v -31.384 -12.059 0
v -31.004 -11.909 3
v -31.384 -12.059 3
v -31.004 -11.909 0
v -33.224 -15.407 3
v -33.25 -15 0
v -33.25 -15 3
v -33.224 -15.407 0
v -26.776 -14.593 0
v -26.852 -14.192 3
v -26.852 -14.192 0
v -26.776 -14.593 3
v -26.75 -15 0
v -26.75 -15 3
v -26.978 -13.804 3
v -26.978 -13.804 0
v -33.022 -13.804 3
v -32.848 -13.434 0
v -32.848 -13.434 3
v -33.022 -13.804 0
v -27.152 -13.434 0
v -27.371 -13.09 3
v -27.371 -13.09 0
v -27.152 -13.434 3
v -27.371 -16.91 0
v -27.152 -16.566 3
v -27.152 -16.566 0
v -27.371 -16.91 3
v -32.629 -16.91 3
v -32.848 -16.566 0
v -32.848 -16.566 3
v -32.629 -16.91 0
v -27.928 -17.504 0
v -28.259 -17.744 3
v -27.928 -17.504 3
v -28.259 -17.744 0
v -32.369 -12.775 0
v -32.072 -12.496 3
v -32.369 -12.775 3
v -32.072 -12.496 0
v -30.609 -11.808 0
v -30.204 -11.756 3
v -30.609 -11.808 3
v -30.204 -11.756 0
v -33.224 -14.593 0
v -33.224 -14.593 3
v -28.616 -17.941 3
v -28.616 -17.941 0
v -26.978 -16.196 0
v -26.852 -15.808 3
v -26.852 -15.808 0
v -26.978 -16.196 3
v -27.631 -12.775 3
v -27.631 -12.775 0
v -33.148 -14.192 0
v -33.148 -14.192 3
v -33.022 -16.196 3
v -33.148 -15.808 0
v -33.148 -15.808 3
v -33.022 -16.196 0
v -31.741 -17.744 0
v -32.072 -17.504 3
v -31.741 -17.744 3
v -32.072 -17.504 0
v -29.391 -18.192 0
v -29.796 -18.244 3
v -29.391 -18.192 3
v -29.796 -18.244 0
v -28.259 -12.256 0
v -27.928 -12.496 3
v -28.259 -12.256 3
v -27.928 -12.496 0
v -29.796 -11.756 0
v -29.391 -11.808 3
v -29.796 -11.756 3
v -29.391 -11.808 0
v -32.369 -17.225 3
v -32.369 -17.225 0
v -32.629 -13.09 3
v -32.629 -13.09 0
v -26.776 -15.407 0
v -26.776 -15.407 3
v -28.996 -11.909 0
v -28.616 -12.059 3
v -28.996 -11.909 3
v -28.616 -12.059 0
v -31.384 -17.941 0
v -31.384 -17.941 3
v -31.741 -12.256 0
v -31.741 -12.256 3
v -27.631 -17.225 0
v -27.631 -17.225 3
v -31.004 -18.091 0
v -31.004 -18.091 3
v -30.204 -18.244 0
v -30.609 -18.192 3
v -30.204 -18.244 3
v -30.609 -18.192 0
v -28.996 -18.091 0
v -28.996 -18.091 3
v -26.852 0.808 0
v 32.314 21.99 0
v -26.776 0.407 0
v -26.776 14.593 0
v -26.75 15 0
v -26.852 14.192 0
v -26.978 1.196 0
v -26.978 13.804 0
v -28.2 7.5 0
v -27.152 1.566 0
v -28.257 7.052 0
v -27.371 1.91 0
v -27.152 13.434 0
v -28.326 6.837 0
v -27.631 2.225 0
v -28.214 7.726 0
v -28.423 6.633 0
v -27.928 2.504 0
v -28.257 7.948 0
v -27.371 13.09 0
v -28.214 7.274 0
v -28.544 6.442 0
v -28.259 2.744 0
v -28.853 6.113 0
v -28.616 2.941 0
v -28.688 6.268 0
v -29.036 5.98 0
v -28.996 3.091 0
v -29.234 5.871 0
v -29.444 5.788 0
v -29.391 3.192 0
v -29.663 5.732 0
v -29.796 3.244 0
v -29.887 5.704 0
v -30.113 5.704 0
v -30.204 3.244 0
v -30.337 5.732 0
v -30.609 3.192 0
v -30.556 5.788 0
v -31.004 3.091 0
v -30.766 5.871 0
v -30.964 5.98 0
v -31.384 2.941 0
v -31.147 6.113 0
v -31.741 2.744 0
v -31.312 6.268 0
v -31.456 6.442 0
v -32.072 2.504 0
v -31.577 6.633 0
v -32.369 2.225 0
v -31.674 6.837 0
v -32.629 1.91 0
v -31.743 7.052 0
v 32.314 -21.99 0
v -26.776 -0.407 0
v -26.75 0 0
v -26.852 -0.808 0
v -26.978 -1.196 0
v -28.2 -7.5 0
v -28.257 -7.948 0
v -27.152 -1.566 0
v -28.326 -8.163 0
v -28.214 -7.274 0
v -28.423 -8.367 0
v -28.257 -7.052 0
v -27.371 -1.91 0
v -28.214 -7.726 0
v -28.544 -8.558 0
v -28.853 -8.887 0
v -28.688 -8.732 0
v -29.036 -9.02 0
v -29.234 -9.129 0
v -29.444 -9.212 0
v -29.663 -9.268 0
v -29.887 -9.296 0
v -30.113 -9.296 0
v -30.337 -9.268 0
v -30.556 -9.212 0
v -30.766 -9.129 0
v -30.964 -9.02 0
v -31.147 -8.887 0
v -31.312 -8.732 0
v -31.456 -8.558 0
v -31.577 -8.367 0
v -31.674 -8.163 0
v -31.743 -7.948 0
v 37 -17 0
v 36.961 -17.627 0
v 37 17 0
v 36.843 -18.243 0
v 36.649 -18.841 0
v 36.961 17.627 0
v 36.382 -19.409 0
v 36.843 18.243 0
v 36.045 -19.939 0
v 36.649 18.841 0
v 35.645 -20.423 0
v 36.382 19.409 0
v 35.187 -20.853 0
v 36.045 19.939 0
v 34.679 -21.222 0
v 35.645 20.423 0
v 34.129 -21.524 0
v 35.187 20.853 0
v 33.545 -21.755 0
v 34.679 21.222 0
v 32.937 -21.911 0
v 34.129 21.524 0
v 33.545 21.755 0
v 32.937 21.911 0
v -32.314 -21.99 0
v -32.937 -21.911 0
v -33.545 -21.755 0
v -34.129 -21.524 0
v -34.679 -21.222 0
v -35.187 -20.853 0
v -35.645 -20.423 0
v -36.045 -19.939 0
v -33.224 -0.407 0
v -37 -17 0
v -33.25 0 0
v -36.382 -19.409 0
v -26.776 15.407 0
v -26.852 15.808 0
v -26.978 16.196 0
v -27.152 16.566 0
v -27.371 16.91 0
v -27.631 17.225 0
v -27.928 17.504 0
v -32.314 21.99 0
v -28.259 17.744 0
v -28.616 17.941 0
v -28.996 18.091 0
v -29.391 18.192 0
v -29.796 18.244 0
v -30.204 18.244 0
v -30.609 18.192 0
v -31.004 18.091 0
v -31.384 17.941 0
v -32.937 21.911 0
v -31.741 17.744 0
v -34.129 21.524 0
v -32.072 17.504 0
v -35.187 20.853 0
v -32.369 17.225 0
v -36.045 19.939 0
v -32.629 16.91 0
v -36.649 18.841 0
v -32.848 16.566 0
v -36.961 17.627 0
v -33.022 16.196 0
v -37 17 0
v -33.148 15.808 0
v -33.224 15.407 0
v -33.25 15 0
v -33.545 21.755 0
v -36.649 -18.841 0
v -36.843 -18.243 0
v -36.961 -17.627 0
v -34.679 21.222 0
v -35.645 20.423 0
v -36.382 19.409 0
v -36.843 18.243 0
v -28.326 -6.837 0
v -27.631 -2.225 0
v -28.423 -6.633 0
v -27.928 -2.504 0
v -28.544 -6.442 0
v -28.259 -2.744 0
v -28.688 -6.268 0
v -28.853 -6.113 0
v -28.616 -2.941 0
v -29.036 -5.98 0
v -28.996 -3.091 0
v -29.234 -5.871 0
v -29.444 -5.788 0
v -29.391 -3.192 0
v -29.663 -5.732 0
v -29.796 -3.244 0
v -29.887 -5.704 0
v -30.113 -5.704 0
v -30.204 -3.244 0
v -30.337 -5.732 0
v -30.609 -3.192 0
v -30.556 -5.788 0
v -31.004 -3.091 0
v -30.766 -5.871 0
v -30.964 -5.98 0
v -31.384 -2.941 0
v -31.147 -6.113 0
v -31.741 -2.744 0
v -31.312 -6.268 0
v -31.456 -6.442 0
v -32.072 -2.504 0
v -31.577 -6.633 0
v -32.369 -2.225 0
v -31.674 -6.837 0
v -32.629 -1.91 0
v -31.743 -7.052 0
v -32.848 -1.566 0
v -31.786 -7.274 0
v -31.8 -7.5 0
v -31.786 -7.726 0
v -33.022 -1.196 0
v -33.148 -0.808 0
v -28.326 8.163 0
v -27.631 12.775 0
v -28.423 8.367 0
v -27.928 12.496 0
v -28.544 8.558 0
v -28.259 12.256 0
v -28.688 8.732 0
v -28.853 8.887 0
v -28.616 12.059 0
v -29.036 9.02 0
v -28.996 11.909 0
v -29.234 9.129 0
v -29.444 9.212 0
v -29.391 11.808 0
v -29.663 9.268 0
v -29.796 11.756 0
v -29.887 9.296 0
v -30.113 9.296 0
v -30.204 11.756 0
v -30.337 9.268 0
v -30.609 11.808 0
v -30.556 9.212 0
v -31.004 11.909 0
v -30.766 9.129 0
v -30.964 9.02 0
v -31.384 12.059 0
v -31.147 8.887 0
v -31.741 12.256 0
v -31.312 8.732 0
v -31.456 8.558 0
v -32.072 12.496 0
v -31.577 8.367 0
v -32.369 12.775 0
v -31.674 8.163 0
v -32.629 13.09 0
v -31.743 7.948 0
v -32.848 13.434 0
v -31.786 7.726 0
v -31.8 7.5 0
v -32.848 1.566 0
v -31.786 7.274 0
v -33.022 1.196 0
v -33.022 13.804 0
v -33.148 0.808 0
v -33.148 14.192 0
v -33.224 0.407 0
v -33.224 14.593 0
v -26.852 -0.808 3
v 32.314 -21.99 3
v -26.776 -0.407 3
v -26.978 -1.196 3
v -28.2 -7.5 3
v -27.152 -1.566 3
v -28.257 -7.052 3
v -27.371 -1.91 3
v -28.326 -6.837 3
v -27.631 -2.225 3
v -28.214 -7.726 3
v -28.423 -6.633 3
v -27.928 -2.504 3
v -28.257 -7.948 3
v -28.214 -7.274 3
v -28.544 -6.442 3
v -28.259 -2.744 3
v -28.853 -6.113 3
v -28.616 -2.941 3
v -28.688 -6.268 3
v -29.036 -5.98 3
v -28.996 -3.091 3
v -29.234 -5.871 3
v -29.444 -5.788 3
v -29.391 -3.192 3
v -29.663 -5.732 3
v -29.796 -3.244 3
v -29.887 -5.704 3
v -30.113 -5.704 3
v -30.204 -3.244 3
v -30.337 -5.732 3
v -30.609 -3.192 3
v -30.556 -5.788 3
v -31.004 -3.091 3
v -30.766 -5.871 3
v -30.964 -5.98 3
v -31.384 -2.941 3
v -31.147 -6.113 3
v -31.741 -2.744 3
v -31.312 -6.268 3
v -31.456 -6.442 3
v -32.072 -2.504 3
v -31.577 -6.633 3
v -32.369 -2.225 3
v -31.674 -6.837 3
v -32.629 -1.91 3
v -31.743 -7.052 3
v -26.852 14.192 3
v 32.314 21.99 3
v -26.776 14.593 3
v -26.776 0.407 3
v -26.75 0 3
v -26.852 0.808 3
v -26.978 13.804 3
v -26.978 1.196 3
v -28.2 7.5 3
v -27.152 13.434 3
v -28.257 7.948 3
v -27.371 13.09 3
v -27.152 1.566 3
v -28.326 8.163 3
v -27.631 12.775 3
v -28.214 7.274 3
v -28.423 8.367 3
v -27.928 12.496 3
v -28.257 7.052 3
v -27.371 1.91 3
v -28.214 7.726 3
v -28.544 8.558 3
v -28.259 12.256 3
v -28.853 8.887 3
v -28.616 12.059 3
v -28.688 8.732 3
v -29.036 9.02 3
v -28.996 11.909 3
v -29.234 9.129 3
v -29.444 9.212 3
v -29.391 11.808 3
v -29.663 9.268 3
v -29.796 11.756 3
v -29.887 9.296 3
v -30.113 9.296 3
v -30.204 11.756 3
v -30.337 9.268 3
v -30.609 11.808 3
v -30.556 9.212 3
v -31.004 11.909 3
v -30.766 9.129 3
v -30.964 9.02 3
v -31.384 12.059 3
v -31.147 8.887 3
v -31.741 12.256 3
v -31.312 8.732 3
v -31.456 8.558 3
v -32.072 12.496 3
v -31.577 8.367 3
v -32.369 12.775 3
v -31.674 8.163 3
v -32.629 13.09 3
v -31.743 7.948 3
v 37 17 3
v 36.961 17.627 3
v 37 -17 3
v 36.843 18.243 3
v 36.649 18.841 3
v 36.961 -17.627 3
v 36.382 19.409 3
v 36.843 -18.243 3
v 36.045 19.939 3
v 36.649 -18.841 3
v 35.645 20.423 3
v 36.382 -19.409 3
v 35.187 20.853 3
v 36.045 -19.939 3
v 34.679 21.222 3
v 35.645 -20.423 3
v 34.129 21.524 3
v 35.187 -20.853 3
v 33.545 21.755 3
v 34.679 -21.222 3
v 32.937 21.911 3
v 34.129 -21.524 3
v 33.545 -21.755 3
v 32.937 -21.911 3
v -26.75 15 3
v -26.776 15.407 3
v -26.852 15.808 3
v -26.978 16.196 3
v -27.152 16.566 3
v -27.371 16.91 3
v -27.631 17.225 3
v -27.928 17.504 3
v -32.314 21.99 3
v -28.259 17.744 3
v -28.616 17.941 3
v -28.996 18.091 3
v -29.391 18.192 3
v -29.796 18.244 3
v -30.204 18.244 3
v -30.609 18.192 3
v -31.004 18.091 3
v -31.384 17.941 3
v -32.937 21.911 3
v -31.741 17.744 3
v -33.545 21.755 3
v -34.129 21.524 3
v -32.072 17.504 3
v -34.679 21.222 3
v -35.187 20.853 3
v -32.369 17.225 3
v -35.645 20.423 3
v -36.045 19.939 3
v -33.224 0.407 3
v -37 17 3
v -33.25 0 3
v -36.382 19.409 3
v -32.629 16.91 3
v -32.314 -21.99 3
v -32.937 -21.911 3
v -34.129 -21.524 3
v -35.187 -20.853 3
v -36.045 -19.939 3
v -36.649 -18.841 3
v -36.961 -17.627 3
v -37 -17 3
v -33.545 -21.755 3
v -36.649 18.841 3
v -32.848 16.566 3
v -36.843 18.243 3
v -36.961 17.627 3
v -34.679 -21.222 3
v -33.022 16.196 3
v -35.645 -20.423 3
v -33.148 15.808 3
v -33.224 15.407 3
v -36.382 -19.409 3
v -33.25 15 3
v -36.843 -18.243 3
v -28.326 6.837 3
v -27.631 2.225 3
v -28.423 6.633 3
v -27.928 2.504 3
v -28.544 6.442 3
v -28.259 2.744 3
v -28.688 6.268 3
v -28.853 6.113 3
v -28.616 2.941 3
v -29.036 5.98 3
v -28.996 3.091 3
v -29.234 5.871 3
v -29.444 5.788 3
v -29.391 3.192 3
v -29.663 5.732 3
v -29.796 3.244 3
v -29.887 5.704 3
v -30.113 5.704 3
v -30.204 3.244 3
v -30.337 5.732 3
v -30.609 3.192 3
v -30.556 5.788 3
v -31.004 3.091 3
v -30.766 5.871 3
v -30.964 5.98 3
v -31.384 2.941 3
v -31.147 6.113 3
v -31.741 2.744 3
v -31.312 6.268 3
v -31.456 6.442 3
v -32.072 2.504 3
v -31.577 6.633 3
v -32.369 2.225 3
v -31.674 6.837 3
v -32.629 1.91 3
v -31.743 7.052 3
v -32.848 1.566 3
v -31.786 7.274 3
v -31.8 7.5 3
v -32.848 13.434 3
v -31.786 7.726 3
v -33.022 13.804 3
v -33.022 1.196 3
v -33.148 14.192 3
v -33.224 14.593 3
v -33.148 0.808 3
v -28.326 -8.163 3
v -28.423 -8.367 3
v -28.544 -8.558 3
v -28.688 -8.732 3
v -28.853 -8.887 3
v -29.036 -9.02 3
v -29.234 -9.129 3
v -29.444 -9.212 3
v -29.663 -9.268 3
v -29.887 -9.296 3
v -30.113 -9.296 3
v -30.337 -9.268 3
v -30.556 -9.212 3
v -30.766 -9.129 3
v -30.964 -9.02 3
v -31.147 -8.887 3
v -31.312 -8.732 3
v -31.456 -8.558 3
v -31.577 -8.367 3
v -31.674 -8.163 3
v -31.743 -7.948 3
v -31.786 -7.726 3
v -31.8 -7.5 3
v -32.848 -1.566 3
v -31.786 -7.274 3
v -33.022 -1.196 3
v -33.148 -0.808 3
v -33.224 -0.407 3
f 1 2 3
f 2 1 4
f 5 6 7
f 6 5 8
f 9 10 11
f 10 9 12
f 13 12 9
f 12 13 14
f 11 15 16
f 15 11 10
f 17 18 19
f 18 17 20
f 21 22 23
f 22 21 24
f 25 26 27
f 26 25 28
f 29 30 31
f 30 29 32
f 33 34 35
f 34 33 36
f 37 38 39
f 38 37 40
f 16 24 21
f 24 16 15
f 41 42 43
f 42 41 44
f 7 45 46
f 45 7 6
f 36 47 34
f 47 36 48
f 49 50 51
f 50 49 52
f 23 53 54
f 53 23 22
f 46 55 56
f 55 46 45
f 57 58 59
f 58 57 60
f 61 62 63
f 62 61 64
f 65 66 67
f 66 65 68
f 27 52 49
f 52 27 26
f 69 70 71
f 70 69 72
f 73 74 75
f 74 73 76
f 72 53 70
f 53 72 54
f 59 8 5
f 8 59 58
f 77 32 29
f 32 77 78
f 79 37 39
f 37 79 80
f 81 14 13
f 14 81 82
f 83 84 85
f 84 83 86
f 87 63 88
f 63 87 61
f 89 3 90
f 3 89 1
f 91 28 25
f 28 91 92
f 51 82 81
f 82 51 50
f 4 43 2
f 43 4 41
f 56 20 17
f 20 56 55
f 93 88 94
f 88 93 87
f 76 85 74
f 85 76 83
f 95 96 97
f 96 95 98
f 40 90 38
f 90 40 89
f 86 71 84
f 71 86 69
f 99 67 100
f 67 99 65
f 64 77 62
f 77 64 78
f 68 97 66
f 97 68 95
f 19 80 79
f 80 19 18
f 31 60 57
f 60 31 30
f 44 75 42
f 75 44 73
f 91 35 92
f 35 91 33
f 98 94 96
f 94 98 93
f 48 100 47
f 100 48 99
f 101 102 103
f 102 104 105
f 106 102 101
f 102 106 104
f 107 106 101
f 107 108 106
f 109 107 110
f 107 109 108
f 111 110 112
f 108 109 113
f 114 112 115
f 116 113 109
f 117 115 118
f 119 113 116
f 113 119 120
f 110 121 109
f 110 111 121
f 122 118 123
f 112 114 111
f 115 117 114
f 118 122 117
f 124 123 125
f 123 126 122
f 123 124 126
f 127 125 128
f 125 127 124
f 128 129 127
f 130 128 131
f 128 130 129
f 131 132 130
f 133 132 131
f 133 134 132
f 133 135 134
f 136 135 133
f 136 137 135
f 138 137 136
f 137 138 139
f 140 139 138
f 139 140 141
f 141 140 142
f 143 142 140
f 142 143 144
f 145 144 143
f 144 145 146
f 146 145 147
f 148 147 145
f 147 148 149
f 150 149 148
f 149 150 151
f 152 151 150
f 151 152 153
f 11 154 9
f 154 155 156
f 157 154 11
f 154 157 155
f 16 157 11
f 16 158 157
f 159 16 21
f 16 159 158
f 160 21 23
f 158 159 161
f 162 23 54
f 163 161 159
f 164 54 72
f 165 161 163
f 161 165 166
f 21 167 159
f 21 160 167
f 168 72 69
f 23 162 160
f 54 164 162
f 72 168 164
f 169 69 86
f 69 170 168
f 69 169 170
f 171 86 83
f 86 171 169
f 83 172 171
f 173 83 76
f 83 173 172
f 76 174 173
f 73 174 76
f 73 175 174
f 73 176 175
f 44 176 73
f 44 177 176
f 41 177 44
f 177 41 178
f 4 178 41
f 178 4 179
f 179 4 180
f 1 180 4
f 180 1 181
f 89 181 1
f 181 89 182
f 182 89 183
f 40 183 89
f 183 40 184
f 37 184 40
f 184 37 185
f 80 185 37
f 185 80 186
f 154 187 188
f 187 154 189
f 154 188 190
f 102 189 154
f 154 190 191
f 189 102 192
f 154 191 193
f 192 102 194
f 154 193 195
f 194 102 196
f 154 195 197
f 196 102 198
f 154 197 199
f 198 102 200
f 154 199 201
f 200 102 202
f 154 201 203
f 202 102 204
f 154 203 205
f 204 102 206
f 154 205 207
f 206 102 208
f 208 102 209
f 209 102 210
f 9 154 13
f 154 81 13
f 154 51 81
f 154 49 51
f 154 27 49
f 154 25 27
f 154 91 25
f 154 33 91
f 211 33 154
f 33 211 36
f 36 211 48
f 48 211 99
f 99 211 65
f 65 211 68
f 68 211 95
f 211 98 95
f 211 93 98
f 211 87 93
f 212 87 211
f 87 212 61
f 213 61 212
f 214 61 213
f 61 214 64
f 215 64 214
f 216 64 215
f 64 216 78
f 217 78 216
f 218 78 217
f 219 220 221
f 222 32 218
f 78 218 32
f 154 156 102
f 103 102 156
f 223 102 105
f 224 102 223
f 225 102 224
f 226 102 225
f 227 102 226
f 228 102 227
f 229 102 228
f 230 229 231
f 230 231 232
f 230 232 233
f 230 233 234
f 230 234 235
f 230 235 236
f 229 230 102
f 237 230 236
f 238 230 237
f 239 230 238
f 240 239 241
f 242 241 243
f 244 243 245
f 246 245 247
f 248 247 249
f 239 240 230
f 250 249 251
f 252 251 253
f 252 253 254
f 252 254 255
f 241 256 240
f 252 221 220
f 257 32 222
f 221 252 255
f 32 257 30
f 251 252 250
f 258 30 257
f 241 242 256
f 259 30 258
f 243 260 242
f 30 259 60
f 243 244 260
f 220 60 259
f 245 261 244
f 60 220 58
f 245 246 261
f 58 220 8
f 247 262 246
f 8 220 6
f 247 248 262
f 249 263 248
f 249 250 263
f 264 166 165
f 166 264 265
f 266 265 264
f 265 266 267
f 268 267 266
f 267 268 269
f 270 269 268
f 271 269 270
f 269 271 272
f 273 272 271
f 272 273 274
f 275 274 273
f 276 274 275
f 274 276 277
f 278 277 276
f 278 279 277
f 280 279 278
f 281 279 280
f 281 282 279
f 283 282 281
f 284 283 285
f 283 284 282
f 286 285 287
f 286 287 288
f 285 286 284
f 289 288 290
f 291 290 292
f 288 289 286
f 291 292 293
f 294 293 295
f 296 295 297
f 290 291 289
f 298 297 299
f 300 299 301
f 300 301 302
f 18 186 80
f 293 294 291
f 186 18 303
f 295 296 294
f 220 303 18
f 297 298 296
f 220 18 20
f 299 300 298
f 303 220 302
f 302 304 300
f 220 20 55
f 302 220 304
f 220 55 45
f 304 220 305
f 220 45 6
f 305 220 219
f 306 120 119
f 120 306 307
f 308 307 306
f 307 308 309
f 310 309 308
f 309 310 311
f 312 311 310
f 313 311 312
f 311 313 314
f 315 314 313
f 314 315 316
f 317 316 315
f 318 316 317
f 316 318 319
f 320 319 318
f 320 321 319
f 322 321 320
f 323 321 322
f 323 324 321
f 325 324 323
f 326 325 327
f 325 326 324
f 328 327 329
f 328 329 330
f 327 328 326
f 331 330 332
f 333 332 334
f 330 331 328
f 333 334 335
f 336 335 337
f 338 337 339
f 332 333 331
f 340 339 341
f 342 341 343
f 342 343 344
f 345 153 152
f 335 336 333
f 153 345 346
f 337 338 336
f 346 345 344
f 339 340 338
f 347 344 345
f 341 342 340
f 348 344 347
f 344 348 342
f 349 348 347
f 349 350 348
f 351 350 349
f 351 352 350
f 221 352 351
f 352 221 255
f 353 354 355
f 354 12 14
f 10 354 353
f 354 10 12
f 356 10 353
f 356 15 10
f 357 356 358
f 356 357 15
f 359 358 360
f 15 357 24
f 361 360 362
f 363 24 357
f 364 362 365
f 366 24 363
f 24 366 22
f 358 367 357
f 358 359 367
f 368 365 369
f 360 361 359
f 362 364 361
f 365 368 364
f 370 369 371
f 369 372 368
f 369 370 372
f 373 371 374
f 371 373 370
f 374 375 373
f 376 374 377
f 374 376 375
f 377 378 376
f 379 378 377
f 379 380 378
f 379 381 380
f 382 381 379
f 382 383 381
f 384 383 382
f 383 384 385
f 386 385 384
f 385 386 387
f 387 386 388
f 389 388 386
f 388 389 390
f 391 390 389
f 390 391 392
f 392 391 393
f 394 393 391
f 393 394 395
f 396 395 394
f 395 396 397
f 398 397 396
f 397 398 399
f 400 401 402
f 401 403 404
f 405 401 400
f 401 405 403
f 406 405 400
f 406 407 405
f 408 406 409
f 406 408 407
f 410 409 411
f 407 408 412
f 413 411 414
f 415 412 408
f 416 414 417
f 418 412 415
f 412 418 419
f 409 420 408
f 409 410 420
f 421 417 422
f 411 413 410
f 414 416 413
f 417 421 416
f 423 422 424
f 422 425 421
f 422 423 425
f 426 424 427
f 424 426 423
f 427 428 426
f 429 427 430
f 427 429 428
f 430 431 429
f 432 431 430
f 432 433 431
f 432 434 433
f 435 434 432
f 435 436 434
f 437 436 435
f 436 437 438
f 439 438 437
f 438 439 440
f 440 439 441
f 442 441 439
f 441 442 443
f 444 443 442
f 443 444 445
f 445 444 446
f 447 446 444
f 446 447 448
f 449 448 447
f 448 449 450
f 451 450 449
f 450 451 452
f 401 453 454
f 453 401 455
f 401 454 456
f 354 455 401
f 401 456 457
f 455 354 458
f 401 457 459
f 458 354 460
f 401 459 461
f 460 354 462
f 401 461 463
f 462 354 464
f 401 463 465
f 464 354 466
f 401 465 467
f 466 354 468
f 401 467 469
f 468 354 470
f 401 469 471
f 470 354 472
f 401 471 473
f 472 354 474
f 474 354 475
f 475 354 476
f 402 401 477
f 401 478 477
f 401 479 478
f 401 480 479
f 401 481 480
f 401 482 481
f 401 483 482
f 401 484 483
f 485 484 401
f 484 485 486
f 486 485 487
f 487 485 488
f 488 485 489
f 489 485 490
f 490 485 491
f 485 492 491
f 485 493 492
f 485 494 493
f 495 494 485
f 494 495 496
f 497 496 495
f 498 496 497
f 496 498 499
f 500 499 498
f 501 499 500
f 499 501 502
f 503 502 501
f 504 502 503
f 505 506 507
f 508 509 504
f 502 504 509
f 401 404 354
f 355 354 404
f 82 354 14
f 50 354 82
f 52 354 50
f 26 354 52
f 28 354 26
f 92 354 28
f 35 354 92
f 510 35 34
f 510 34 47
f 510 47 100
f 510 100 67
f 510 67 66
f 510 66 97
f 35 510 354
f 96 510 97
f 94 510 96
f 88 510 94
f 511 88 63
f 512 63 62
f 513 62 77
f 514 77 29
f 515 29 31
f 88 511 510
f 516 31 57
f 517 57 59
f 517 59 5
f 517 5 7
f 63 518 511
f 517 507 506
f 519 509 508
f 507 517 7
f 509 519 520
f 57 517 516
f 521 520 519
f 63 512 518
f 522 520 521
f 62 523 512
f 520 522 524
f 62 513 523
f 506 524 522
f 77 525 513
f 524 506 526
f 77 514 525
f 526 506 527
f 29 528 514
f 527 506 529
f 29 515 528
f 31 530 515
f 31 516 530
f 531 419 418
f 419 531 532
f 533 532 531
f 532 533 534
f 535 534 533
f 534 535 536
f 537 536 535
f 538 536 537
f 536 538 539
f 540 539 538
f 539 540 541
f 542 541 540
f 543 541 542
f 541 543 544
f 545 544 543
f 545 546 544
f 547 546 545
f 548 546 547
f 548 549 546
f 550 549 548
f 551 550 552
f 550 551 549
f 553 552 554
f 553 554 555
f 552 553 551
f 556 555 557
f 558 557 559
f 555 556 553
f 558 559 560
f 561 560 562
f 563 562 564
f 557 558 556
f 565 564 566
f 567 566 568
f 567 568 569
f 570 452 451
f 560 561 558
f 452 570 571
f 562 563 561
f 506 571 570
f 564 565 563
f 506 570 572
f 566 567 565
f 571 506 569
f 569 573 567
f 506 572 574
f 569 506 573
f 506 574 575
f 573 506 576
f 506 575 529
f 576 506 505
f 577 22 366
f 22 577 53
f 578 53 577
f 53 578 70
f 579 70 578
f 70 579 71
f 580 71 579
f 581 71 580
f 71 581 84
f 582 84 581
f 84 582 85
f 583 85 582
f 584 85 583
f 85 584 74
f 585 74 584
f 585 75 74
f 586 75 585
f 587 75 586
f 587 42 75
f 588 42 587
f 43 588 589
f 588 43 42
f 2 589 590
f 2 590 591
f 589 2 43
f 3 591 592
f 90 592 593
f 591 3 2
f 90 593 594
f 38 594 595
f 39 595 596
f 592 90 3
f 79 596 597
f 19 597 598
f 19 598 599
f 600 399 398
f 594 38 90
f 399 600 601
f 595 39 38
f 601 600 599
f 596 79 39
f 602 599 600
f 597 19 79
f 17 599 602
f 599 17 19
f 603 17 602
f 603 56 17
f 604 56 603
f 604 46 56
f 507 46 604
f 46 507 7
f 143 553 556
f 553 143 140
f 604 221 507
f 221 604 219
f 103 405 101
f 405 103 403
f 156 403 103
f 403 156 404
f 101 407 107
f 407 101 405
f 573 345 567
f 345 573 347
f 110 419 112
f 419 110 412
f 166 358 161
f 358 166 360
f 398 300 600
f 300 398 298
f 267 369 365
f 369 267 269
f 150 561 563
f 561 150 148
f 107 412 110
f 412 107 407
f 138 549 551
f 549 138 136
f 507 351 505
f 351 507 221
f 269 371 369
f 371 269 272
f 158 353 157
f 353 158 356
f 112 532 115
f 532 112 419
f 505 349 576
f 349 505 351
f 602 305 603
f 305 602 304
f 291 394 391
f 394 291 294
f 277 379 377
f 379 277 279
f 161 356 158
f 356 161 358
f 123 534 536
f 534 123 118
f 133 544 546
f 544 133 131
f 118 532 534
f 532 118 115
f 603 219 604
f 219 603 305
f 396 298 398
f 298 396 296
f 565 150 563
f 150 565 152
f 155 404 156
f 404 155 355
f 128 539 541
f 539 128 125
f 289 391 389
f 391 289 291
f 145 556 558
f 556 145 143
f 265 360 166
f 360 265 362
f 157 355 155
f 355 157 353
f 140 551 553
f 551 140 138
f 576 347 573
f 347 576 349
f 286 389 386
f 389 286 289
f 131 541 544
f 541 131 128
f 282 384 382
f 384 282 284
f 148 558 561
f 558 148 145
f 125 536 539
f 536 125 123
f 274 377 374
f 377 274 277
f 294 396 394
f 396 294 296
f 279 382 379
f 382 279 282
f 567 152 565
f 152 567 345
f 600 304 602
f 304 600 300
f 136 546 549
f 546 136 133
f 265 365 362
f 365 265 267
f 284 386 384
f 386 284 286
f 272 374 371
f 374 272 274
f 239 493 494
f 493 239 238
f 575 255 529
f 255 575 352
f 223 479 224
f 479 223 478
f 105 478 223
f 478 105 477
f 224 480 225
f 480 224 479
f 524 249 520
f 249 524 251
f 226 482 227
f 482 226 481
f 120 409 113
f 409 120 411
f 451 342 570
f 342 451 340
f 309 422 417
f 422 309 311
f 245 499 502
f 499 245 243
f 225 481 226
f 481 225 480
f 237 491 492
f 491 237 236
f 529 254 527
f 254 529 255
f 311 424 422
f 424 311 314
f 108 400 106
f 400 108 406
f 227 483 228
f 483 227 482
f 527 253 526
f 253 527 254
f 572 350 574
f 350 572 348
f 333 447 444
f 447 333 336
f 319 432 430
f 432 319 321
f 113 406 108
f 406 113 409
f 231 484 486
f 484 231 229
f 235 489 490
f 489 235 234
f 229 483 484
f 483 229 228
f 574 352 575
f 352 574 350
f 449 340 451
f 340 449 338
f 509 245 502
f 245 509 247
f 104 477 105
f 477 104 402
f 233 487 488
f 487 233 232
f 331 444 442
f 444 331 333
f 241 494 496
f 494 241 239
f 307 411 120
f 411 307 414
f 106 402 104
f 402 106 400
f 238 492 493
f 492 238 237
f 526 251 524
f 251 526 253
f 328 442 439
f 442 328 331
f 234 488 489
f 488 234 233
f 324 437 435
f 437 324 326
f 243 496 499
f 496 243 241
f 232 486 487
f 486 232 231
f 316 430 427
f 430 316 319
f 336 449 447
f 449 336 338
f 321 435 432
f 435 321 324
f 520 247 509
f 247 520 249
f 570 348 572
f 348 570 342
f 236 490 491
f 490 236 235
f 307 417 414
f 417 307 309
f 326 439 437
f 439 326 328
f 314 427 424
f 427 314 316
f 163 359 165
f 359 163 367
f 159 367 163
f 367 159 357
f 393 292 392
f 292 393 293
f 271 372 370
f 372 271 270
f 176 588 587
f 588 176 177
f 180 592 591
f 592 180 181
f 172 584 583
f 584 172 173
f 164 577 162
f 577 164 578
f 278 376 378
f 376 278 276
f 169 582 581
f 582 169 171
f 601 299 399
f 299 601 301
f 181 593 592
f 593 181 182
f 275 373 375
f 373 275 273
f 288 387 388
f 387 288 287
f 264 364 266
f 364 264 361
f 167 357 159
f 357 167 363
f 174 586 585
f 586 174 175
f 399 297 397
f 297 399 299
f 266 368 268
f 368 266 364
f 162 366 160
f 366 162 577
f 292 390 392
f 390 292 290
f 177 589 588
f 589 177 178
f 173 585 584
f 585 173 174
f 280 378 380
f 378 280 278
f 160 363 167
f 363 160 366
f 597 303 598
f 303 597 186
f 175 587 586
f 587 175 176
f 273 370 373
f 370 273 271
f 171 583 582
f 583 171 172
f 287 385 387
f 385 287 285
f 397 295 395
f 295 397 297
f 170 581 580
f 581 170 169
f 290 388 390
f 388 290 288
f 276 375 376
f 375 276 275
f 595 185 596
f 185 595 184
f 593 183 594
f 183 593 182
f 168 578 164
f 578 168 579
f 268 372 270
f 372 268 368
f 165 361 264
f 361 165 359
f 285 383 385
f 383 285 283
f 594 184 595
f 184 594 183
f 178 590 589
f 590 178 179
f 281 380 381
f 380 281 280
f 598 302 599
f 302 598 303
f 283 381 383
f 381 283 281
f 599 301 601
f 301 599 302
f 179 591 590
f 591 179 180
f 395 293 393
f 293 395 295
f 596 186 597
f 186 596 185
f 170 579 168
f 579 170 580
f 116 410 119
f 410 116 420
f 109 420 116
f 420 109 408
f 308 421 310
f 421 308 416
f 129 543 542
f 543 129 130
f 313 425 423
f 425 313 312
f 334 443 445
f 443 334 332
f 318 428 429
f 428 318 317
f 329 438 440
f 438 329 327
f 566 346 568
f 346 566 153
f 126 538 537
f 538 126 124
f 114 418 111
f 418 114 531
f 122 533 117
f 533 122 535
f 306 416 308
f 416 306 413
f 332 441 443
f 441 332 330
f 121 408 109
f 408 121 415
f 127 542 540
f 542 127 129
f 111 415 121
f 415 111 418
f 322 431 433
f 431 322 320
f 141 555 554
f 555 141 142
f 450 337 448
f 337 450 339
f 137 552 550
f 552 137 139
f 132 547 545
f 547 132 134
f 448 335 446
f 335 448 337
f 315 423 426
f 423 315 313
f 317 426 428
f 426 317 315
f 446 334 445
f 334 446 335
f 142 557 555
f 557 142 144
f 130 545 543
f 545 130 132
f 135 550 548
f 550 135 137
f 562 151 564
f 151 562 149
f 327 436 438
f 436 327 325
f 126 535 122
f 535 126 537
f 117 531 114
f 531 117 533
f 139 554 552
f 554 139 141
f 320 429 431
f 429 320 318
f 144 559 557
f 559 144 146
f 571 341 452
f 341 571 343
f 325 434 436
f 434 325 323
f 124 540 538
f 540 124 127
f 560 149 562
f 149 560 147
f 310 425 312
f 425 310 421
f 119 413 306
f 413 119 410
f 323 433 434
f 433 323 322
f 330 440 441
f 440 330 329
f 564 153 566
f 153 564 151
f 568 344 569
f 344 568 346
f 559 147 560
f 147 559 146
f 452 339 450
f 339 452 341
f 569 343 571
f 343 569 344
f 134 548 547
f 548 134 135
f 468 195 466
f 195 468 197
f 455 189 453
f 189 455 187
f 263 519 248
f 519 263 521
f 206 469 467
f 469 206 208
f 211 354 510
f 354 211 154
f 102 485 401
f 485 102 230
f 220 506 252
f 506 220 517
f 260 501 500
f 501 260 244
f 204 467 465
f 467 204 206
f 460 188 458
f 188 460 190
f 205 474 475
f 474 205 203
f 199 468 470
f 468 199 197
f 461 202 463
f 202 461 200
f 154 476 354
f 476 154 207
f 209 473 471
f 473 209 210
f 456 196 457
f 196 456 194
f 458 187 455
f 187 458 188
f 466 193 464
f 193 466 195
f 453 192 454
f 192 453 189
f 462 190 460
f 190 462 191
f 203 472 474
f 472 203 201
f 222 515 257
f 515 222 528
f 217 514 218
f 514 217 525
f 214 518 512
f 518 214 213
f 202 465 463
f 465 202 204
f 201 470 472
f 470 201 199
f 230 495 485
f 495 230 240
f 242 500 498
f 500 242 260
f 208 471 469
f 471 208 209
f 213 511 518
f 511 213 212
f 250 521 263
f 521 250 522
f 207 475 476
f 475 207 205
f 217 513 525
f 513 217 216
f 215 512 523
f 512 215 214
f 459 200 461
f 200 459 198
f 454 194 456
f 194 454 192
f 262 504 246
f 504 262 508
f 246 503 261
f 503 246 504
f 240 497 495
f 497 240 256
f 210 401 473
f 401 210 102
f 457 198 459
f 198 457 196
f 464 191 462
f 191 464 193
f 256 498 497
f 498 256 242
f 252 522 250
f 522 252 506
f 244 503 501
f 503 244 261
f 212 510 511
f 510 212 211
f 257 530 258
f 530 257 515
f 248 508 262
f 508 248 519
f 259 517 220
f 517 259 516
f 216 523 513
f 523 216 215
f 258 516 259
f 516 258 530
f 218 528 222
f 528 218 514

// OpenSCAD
$fn = 50;


difference() {
	union() {
		hull() {
			translate(v = [-32.0000000000, 17.0000000000, 0]) {
				cylinder(h = 3, r = 5);
			}
			translate(v = [32.0000000000, 17.0000000000, 0]) {
				cylinder(h = 3, r = 5);
			}
			translate(v = [-32.0000000000, -17.0000000000, 0]) {
				cylinder(h = 3, r = 5);
			}
			translate(v = [32.0000000000, -17.0000000000, 0]) {
				cylinder(h = 3, r = 5);
			}
		}
	}
	union() {
		translate(v = [-30.0000000000, -15.0000000000, 0]) {
			cylinder(h = 3, r = 3.2500000000);
		}
		translate(v = [-30.0000000000, 0.0000000000, 0]) {
			cylinder(h = 3, r = 3.2500000000);
		}
		translate(v = [-30.0000000000, 15.0000000000, 0]) {
			cylinder(h = 3, r = 3.2500000000);
		}
		translate(v = [-30.0000000000, -15.0000000000, 0]) {
			cylinder(h = 3, r = 1.8000000000);
		}
		translate(v = [-30.0000000000, -7.5000000000, 0]) {
			cylinder(h = 3, r = 1.8000000000);
		}
		translate(v = [-30.0000000000, 0.0000000000, 0]) {
			cylinder(h = 3, r = 1.8000000000);
		}
		translate(v = [-30.0000000000, 7.5000000000, 0]) {
			cylinder(h = 3, r = 1.8000000000);
		}
		translate(v = [-30.0000000000, 15.0000000000, 0]) {
			cylinder(h = 3, r = 1.8000000000);
		}
		translate(v = [-30.0000000000, -15.0000000000, 0]) {
			cylinder(h = 3, r = 1.8000000000);
		}
		translate(v = [-30.0000000000, -7.5000000000, 0]) {
			cylinder(h = 3, r = 1.8000000000);
		}
		translate(v = [-30.0000000000, 0.0000000000, 0]) {
			cylinder(h = 3, r = 1.8000000000);
		}
		translate(v = [-30.0000000000, 7.5000000000, 0]) {
			cylinder(h = 3, r = 1.8000000000);
		}
		translate(v = [-30.0000000000, 15.0000000000, 0]) {
			cylinder(h = 3, r = 1.8000000000);
		}
		translate(v = [-30.0000000000, -15.0000000000, 0]) {
			cylinder(h = 3, r = 1.8000000000);
		}
		translate(v = [-30.0000000000, -7.5000000000, 0]) {
			cylinder(h = 3, r = 1.8000000000);
		}
		translate(v = [-30.0000000000, 0.0000000000, 0]) {
			cylinder(h = 3, r = 1.8000000000);
		}
		translate(v = [-30.0000000000, 7.5000000000, 0]) {
			cylinder(h = 3, r = 1.8000000000);
		}
		translate(v = [-30.0000000000, 15.0000000000, 0]) {
			cylinder(h = 3, r = 1.8000000000);
		}
	}
}
